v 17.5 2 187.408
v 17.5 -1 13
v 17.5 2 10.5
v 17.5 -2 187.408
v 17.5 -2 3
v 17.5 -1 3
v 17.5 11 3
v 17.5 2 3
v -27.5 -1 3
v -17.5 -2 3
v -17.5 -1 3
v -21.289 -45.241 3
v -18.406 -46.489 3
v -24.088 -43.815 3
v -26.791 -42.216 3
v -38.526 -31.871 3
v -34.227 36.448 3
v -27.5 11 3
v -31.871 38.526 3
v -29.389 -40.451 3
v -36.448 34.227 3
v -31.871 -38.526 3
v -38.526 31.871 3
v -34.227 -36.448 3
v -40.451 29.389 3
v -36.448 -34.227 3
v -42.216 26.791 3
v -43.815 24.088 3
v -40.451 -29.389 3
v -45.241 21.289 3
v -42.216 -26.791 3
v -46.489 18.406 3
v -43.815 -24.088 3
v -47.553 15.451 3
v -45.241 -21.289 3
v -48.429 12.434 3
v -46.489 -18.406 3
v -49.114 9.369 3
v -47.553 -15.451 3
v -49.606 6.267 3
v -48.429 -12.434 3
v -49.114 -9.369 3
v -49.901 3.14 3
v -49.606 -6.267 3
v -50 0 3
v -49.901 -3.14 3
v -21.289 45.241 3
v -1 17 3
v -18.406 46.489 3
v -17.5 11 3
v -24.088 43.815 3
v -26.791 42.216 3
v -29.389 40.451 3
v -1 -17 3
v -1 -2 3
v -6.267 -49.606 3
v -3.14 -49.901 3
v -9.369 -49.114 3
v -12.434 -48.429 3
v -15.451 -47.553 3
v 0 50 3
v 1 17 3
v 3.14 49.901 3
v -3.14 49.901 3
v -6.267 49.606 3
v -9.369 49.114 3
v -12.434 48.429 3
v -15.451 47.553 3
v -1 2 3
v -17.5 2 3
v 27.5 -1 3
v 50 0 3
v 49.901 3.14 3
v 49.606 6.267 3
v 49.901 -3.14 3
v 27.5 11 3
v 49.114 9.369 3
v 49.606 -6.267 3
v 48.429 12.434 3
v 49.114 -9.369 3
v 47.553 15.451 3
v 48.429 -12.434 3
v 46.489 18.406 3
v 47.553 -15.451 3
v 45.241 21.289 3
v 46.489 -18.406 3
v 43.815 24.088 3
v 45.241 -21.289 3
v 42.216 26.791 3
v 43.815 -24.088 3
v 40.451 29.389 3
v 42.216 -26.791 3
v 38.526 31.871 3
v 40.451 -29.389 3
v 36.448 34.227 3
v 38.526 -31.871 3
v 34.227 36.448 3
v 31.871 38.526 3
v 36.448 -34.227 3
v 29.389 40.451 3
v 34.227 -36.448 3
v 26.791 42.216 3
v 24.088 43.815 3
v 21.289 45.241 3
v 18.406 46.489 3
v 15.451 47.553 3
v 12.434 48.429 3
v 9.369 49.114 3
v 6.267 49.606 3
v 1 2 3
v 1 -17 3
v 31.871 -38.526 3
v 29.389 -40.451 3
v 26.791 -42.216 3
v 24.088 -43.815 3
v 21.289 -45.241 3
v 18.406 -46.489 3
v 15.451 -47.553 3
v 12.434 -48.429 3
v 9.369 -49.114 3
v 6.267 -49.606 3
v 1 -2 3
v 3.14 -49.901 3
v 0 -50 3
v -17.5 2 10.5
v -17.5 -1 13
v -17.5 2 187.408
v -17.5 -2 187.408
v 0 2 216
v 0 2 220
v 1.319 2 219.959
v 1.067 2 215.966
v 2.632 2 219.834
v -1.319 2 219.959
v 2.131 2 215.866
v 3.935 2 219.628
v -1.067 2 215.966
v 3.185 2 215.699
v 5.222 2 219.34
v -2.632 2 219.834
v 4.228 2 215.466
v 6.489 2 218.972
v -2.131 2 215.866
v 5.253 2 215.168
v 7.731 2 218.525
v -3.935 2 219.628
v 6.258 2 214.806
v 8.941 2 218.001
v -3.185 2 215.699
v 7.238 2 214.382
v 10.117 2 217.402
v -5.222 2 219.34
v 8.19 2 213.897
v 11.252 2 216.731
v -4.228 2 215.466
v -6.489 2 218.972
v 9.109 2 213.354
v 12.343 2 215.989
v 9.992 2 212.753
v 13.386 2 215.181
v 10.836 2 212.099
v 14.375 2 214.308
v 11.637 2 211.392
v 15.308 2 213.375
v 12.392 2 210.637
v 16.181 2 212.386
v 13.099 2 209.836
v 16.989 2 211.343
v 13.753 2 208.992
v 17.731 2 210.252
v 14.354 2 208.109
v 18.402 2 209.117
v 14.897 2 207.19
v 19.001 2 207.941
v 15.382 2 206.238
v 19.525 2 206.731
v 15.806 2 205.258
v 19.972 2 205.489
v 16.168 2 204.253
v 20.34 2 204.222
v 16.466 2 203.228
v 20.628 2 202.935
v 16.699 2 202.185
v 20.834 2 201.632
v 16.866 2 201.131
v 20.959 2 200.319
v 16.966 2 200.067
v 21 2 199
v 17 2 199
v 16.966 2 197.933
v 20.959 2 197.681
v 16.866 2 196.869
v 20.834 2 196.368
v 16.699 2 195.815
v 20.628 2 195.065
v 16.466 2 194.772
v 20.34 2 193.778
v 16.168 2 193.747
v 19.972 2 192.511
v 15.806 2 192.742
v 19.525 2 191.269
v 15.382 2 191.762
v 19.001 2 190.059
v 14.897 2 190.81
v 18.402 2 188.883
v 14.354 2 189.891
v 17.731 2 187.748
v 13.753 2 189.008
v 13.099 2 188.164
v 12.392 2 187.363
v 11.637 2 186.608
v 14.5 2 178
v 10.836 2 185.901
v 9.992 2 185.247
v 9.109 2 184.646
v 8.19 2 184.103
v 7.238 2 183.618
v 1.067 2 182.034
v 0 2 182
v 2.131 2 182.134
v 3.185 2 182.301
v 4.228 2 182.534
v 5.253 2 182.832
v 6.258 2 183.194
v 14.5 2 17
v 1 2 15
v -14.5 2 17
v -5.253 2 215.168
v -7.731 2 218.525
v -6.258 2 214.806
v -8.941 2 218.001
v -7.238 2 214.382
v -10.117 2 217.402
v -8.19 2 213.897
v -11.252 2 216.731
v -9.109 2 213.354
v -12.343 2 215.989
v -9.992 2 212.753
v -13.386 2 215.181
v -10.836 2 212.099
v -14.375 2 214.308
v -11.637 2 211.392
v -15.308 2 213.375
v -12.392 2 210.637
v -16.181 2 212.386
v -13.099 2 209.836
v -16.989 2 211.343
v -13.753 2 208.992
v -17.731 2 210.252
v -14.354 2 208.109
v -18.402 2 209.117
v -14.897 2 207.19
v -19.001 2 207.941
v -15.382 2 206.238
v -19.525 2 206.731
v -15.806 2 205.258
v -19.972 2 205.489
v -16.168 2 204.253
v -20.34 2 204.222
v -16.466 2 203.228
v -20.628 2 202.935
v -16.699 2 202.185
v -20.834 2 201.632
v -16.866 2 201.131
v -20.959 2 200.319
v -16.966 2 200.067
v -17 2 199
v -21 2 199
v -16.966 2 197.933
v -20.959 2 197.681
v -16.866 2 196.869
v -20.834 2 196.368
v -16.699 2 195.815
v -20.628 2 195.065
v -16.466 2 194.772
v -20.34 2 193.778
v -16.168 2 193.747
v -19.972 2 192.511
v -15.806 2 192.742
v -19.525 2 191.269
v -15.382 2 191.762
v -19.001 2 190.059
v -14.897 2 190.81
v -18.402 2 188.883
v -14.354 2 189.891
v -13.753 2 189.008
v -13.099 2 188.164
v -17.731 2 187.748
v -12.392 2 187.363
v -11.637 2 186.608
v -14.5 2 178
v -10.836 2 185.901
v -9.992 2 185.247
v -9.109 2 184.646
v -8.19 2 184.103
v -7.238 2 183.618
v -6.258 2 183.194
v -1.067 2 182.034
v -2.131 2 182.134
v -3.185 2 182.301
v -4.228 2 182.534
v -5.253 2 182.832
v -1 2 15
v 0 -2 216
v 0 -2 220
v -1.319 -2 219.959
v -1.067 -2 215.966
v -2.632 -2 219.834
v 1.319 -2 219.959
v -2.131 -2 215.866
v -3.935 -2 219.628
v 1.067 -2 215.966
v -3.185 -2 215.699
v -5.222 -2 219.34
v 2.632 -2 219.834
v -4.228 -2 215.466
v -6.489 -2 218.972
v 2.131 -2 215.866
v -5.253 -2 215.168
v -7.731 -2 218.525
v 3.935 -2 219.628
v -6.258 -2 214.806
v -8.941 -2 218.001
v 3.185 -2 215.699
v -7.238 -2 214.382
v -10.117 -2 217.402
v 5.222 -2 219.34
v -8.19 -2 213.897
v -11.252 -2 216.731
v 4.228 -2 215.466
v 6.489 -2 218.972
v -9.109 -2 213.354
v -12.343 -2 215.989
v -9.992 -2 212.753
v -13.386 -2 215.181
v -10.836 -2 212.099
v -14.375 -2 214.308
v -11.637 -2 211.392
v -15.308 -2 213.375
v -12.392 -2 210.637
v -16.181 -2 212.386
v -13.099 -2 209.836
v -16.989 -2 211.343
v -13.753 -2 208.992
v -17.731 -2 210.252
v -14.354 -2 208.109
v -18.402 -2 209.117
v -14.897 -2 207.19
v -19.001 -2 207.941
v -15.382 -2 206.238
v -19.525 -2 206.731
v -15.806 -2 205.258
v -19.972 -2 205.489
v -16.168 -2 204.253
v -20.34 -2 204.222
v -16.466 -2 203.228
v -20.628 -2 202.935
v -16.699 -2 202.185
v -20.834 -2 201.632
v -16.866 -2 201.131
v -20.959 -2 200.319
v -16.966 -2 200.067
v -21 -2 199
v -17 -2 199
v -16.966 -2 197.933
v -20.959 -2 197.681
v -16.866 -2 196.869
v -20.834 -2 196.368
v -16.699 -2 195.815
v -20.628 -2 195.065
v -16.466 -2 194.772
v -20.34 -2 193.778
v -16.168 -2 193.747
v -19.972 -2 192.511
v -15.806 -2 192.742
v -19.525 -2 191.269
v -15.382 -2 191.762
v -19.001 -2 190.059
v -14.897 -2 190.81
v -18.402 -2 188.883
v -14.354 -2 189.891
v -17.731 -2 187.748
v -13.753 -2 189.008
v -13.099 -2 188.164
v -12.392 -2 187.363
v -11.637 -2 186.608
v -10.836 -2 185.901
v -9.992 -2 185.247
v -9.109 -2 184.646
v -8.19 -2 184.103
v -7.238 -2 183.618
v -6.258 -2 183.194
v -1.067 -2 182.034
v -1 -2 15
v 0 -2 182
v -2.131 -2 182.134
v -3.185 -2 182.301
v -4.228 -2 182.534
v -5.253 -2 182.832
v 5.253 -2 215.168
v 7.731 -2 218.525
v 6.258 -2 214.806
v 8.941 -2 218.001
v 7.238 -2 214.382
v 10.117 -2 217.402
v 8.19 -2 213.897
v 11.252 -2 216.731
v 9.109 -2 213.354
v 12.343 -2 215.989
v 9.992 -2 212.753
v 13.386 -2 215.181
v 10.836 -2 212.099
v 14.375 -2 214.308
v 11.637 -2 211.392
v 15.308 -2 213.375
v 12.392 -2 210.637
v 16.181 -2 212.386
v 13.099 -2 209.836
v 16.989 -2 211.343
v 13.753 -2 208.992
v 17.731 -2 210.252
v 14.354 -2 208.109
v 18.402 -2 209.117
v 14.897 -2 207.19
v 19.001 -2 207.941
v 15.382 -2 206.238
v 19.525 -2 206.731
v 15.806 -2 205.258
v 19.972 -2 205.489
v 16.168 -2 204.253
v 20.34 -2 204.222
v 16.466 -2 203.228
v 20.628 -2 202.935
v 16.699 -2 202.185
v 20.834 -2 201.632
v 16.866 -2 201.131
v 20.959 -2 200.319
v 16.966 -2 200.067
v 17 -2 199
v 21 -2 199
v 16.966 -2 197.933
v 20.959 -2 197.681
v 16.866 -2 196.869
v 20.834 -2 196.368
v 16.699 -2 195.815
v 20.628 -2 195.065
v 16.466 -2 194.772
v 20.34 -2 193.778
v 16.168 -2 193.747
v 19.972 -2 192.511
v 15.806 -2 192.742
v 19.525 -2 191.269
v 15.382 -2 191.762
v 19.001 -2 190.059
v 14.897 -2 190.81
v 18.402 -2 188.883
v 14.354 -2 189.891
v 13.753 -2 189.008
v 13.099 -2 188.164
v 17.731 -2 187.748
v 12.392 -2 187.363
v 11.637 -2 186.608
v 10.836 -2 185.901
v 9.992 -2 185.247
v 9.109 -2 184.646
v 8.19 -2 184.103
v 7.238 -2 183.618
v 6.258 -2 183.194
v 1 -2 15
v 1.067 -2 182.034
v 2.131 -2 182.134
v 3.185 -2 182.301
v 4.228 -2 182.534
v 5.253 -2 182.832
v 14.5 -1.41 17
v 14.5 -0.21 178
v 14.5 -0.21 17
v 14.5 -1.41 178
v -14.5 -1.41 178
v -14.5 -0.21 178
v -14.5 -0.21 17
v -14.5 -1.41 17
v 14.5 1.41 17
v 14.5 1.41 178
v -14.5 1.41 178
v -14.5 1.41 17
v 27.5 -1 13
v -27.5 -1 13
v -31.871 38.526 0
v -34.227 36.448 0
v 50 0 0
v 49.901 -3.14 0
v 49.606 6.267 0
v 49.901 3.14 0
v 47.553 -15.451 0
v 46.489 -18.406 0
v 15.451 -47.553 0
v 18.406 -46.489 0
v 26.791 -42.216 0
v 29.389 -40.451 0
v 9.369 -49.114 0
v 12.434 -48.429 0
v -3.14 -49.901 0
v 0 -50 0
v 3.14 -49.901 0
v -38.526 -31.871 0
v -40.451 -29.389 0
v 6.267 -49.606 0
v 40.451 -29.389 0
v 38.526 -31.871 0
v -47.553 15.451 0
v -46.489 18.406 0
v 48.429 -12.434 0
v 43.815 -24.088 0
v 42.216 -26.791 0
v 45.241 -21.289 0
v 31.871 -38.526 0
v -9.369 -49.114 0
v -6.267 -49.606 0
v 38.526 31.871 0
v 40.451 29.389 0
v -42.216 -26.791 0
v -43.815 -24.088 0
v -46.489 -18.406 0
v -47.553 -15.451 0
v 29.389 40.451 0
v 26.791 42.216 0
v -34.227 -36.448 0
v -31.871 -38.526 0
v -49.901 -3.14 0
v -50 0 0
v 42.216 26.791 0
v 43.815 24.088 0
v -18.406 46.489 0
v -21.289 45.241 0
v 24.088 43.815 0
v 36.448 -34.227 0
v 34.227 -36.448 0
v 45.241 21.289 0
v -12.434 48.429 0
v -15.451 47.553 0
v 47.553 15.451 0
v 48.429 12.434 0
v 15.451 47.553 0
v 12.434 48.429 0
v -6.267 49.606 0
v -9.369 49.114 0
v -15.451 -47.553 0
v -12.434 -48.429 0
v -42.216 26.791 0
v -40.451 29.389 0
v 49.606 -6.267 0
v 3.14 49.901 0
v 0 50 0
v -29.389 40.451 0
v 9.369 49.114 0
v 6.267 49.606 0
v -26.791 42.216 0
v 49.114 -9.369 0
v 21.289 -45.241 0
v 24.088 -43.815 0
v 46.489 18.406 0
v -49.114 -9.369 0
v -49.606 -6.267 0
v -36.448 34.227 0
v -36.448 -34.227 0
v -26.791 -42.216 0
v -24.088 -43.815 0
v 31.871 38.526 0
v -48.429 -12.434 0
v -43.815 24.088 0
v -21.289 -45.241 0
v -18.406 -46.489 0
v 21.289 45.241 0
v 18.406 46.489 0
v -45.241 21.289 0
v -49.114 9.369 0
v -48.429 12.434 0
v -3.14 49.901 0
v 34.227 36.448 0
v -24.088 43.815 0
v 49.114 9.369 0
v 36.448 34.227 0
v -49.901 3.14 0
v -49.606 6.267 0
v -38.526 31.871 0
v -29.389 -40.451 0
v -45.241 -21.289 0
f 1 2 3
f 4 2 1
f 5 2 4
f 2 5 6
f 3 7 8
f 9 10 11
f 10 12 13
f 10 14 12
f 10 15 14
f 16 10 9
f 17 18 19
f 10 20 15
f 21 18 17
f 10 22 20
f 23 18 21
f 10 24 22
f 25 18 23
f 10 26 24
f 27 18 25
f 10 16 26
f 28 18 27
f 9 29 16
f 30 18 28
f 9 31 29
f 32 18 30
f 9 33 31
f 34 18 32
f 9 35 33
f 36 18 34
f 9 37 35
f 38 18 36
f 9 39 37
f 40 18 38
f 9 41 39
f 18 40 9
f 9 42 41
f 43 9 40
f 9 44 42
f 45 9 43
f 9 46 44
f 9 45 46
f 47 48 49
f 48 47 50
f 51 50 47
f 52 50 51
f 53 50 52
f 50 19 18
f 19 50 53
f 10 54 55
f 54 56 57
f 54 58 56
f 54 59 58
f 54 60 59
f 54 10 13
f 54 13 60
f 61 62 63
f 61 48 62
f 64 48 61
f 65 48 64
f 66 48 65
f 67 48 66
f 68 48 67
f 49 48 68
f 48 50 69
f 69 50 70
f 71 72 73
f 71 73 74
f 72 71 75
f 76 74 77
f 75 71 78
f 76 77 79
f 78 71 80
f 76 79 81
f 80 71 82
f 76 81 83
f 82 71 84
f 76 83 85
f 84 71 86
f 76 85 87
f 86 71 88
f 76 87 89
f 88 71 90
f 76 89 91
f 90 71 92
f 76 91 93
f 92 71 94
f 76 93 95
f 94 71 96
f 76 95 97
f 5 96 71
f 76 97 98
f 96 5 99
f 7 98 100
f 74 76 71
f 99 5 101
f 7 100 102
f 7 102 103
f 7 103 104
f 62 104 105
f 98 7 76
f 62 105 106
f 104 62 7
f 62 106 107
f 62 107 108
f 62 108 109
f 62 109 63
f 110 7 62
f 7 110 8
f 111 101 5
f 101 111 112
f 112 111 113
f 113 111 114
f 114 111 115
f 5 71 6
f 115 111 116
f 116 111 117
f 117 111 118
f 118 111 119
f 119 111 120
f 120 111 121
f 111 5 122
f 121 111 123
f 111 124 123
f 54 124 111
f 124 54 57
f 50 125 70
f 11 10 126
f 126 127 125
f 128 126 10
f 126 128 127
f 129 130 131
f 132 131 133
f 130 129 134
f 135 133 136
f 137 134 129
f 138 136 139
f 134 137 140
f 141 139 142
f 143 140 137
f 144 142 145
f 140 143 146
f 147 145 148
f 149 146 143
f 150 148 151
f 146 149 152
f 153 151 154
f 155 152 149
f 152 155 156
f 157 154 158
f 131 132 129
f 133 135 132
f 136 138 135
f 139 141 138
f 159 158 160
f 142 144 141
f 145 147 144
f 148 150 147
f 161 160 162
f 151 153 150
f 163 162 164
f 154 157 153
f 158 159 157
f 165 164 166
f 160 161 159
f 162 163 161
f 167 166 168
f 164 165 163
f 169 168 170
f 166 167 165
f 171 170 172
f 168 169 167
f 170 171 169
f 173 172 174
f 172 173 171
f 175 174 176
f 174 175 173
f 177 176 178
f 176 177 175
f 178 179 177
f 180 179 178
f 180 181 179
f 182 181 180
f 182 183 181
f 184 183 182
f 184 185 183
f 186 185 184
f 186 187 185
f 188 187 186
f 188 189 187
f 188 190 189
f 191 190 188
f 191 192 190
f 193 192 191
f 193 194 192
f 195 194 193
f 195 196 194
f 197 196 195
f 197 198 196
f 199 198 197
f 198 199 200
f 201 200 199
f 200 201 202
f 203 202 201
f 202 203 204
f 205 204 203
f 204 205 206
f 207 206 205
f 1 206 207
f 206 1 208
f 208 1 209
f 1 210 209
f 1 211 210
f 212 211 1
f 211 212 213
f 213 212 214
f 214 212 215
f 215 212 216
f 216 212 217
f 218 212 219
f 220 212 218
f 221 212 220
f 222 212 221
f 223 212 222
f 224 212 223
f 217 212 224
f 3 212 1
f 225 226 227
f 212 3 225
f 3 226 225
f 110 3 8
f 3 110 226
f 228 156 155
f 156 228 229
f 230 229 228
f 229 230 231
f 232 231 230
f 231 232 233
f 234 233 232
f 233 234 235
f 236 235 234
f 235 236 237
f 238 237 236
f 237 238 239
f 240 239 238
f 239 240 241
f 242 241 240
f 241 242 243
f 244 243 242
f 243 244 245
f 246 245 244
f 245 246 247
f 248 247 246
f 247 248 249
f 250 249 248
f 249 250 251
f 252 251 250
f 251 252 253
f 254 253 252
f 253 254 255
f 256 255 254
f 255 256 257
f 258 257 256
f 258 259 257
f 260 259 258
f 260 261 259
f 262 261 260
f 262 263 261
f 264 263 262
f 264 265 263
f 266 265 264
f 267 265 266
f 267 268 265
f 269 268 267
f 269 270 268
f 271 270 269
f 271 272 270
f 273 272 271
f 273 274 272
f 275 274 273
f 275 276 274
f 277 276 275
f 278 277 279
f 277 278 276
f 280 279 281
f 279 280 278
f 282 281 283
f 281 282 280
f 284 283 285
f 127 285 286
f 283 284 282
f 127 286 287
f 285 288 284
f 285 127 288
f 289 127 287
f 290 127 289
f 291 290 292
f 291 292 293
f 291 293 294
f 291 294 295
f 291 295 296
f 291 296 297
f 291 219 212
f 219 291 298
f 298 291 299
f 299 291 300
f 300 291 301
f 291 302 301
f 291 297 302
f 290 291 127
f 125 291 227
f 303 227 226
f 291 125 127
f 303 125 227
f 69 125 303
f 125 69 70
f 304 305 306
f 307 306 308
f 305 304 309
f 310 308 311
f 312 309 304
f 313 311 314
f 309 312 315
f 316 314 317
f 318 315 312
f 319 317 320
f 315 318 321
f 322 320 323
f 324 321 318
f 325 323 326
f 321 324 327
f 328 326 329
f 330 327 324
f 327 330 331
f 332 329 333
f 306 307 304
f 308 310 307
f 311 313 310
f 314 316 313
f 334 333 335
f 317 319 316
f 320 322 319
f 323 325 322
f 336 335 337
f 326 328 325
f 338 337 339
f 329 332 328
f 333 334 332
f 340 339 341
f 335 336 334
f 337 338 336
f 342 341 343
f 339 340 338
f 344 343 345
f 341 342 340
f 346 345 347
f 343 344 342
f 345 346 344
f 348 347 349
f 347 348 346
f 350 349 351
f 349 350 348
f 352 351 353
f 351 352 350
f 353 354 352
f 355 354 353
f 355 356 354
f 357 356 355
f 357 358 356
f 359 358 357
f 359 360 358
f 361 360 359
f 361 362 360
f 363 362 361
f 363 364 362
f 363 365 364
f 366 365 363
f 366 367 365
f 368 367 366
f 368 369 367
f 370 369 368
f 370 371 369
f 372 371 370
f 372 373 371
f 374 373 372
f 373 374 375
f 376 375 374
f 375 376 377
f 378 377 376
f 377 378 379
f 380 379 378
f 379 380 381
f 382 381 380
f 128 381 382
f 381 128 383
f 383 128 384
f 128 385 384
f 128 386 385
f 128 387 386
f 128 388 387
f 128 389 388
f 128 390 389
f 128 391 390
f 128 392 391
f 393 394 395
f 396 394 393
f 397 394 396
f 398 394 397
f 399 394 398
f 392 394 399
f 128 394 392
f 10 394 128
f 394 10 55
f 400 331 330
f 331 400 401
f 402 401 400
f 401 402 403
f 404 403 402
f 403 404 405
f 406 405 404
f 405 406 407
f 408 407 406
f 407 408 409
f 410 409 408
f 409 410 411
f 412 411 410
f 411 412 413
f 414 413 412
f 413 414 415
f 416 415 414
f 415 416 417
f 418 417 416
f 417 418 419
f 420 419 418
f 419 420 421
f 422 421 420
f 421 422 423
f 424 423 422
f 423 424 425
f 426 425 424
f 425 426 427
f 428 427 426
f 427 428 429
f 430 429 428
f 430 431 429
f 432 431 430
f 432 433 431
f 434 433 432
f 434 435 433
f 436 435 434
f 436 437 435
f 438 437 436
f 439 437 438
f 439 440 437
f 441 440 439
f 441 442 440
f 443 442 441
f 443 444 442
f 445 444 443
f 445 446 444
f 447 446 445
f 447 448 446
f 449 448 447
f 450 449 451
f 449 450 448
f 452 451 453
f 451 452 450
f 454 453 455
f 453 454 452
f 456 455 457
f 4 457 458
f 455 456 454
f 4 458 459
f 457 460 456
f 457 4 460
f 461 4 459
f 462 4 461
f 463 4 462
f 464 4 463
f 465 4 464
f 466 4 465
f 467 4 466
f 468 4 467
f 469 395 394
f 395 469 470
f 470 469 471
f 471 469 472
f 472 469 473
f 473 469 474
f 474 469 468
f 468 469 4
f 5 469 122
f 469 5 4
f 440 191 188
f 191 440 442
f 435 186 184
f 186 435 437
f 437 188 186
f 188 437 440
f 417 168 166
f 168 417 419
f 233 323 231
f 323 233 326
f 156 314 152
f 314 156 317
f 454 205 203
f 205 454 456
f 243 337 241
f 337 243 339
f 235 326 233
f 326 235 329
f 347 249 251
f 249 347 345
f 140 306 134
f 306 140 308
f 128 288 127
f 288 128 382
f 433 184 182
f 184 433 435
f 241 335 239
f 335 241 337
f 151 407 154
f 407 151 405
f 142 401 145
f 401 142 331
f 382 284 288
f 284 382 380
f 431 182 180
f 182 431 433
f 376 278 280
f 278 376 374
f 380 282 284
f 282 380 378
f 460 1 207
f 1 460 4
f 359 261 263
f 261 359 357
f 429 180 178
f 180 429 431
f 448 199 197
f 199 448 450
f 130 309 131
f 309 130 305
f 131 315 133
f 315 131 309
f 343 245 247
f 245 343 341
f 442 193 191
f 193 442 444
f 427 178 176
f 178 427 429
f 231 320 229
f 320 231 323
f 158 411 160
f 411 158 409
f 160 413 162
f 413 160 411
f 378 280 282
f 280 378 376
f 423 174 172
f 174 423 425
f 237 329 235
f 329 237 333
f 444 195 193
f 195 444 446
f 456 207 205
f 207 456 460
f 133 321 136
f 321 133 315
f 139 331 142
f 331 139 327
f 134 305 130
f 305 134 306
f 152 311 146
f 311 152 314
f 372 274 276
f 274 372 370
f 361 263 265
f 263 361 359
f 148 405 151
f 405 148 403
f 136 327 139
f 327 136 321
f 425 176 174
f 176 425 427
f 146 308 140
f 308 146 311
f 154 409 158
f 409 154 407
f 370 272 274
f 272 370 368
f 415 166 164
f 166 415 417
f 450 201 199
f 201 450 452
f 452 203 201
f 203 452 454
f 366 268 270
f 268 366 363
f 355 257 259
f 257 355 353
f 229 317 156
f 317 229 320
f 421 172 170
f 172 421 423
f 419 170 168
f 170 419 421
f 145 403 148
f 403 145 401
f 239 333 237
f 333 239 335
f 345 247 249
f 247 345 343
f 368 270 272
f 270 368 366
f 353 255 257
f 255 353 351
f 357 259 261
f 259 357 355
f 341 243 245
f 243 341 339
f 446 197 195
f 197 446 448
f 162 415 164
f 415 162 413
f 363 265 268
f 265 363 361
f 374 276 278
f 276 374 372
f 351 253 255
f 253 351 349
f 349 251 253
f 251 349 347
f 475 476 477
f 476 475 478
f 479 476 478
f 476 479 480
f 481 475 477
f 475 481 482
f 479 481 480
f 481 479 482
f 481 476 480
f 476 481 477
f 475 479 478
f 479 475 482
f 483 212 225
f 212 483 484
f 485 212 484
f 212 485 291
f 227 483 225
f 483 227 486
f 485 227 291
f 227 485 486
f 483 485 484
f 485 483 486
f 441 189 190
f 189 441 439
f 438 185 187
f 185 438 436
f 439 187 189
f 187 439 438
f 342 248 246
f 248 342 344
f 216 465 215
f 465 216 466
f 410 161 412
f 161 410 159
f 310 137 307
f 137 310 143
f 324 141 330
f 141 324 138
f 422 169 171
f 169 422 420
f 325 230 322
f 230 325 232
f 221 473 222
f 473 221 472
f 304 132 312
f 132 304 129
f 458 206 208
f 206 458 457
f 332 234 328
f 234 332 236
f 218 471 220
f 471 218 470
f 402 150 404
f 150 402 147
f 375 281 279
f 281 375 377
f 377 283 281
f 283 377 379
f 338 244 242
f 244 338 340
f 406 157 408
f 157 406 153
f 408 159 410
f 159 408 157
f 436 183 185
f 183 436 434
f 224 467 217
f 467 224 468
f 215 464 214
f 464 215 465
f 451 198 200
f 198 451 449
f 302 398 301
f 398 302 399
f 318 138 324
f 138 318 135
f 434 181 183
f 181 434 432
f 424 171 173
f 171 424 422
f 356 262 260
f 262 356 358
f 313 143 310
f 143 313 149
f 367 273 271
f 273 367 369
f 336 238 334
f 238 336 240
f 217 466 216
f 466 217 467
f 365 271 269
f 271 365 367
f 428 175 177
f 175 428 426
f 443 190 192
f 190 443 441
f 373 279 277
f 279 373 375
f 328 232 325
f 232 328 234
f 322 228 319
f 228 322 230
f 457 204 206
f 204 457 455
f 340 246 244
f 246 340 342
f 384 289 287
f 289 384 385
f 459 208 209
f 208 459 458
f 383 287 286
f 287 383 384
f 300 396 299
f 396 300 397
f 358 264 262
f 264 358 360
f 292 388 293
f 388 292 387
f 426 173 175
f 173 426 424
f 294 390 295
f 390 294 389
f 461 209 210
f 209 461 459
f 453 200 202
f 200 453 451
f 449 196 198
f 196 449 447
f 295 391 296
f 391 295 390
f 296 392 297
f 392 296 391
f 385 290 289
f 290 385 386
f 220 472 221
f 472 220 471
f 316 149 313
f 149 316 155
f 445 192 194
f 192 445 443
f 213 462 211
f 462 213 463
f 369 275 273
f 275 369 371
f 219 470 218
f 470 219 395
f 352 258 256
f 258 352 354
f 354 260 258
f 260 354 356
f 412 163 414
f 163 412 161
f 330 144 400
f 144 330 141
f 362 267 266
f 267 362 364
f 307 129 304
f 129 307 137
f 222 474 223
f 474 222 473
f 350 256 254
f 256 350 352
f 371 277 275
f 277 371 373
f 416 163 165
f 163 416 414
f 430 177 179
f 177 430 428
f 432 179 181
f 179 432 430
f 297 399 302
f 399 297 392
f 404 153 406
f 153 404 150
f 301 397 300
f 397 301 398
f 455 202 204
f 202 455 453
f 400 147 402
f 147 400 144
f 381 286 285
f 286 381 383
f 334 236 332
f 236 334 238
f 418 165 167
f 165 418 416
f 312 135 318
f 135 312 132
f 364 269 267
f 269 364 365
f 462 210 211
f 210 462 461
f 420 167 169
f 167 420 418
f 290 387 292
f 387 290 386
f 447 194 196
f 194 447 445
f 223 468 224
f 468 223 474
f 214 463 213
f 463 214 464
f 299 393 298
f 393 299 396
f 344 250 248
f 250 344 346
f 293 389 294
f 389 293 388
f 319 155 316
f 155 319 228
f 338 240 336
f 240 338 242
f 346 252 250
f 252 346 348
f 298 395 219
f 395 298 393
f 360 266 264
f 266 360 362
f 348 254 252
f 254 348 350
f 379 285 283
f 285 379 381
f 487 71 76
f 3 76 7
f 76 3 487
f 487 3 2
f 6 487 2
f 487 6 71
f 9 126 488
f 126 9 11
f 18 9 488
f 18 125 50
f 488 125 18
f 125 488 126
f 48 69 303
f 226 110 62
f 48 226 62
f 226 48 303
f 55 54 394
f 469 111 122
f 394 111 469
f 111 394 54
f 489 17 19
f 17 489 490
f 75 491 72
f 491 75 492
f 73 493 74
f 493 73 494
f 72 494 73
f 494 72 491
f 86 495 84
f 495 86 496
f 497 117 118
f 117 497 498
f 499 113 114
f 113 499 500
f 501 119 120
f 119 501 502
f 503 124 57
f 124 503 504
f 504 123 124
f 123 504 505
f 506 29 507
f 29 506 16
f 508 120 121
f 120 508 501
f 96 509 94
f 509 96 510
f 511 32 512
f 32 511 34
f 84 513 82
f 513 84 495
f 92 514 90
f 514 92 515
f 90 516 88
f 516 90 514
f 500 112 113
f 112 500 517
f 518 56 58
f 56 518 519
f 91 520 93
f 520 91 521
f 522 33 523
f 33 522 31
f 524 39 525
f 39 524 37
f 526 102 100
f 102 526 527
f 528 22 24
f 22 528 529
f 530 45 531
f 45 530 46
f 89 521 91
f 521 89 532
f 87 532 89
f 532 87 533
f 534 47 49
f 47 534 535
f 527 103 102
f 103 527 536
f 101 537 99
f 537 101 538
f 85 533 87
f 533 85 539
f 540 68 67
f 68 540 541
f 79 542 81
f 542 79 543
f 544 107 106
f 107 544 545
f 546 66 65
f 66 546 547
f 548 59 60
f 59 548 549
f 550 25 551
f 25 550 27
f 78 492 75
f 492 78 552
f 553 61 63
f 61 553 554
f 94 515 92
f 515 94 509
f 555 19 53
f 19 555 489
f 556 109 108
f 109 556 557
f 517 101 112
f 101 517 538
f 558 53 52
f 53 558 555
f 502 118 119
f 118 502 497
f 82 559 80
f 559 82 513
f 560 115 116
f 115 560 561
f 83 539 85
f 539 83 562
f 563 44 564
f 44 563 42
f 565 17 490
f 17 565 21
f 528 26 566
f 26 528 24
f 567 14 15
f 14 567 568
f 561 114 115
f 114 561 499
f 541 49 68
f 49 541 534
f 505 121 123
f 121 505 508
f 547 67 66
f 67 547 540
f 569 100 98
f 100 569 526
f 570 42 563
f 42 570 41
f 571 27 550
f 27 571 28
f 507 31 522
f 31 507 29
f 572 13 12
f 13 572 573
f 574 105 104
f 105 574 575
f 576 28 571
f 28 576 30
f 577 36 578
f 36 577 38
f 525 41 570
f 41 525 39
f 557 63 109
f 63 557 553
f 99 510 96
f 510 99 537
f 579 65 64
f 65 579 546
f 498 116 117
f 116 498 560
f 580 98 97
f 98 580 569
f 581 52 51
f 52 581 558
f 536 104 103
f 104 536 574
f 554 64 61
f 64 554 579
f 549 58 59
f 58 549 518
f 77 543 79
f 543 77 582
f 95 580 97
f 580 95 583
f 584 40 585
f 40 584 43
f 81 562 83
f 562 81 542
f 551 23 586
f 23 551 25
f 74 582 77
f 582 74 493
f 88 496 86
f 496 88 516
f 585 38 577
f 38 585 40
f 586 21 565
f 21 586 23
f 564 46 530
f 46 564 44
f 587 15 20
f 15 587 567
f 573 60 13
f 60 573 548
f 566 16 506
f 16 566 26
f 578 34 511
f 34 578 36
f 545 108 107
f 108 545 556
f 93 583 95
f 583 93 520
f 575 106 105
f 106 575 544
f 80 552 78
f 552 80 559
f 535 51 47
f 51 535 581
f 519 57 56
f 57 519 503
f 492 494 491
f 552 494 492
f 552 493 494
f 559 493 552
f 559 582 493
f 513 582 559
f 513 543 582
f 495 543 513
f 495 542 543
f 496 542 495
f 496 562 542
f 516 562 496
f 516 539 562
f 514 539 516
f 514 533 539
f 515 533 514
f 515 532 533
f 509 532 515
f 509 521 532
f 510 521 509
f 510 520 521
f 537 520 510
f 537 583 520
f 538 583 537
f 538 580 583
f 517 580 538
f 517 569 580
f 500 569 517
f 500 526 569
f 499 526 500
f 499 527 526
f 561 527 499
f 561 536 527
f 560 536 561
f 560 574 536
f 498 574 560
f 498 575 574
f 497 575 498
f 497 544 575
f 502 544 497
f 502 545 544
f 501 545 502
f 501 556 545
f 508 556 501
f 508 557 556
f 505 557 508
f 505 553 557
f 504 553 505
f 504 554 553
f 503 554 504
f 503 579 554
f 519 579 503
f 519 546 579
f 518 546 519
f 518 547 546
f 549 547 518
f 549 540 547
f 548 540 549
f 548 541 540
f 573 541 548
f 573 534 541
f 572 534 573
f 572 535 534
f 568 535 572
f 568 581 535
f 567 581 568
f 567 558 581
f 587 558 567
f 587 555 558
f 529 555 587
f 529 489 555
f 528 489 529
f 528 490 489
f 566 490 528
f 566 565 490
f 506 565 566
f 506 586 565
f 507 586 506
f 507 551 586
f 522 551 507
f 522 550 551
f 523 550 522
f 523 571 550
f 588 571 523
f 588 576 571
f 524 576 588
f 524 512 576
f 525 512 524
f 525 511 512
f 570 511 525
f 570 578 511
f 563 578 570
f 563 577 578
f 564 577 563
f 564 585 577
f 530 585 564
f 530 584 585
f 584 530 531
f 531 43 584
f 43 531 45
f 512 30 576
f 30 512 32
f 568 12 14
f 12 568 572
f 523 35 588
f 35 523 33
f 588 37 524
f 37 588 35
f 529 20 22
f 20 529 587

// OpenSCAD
// ==========================================
// PARAMETRIC TARGET POST MODEL
// ==========================================

$fn = 100; // Smooth circles

// --- Dimensions (in mm) ---
base_diameter  = 100;   // ~3.15 inches base
base_thickness = 3;    // Base disk height
total_height   = 220;  // Overall height from bottom to top

stem_width     = 35;   // Width of main vertical body
stem_thickness = 4;    // Thickness of main body wall
inset_depth    = 1.2;  // Inset recess detail depth
border_width   = 3;    // Outer border frame around inset

// --- Updated Top Ring Dimensions (Fits THROUGH 1.75" Cone Hole) ---
handle_outer_r = 21;   // ~1.65" Outer Diameter to fit through 1.75" hole with clearance
handle_inner_r = 17;   // Inner finger-grab opening radius

// --- Support Gussets ---
rib_height     = 12;   
rib_length_side = 10;  
rib_length_front = 15; 
rib_thickness  = 2;    

// ==========================================
// GEOMETRY GENERATION
// ==========================================

module main_post() {
    union() {
        // 1. Circular Base
        cylinder(h = base_thickness, d = base_diameter);

        // 2. Main Vertical Stem & Handle Assembly
        difference() {
            union() {
                // Vertical Rectangular Column
                translate([-stem_width/2, -stem_thickness/2, base_thickness])
                    cube([stem_width, stem_thickness, total_height - base_thickness - handle_outer_r]);

                // Top Ring Outer
                translate([0, 0, total_height - handle_outer_r])
                    rotate([90, 0, 0])
                    cylinder(h = stem_thickness, r = handle_outer_r, center = true);
            }

            // Top Ring Inner Hole
            translate([0, 0, total_height - handle_outer_r])
                rotate([90, 0, 0])
                cylinder(h = stem_thickness + 2, r = handle_inner_r, center = true);

            // Front & Back Inset Recesses
            for (side = [-1, 1]) {
                translate([
                    -(stem_width/2 - border_width), 
                    side * (stem_thickness/2 - inset_depth/2 + 0.01), 
                    base_thickness + rib_height + 2
                ])
                cube([
                    stem_width - (border_width * 2), 
                    inset_depth, 
                    total_height - base_thickness - (handle_outer_r * 2) - rib_height - 2
                ]);
            }
        }

        // 3. Small Support Gussets
        // Side Ribs (X-axis)
        for (m = [0, 1]) {
            mirror([m, 0, 0])
            translate([stem_width/2, -rib_thickness/2, base_thickness])
            rotate([90, 0, 90])
            linear_extrude(height = rib_length_side)
                polygon(points = [[0,0], [rib_height, 0], [0, rib_length_side]]);
        }

        // Front / Back Center Ribs (Y-axis)
        for (m = [0, 1]) {
            mirror([0, m, 0])
            translate([-rib_thickness/2, stem_thickness/2, base_thickness])
            rotate([90, 0, 0])
            rotate([0, 90, 0])
            linear_extrude(height = rib_thickness)
                polygon(points = [[0,0], [rib_length_front, 0], [0, rib_height]]);
        }
    }
}

// Render Model
main_post();
